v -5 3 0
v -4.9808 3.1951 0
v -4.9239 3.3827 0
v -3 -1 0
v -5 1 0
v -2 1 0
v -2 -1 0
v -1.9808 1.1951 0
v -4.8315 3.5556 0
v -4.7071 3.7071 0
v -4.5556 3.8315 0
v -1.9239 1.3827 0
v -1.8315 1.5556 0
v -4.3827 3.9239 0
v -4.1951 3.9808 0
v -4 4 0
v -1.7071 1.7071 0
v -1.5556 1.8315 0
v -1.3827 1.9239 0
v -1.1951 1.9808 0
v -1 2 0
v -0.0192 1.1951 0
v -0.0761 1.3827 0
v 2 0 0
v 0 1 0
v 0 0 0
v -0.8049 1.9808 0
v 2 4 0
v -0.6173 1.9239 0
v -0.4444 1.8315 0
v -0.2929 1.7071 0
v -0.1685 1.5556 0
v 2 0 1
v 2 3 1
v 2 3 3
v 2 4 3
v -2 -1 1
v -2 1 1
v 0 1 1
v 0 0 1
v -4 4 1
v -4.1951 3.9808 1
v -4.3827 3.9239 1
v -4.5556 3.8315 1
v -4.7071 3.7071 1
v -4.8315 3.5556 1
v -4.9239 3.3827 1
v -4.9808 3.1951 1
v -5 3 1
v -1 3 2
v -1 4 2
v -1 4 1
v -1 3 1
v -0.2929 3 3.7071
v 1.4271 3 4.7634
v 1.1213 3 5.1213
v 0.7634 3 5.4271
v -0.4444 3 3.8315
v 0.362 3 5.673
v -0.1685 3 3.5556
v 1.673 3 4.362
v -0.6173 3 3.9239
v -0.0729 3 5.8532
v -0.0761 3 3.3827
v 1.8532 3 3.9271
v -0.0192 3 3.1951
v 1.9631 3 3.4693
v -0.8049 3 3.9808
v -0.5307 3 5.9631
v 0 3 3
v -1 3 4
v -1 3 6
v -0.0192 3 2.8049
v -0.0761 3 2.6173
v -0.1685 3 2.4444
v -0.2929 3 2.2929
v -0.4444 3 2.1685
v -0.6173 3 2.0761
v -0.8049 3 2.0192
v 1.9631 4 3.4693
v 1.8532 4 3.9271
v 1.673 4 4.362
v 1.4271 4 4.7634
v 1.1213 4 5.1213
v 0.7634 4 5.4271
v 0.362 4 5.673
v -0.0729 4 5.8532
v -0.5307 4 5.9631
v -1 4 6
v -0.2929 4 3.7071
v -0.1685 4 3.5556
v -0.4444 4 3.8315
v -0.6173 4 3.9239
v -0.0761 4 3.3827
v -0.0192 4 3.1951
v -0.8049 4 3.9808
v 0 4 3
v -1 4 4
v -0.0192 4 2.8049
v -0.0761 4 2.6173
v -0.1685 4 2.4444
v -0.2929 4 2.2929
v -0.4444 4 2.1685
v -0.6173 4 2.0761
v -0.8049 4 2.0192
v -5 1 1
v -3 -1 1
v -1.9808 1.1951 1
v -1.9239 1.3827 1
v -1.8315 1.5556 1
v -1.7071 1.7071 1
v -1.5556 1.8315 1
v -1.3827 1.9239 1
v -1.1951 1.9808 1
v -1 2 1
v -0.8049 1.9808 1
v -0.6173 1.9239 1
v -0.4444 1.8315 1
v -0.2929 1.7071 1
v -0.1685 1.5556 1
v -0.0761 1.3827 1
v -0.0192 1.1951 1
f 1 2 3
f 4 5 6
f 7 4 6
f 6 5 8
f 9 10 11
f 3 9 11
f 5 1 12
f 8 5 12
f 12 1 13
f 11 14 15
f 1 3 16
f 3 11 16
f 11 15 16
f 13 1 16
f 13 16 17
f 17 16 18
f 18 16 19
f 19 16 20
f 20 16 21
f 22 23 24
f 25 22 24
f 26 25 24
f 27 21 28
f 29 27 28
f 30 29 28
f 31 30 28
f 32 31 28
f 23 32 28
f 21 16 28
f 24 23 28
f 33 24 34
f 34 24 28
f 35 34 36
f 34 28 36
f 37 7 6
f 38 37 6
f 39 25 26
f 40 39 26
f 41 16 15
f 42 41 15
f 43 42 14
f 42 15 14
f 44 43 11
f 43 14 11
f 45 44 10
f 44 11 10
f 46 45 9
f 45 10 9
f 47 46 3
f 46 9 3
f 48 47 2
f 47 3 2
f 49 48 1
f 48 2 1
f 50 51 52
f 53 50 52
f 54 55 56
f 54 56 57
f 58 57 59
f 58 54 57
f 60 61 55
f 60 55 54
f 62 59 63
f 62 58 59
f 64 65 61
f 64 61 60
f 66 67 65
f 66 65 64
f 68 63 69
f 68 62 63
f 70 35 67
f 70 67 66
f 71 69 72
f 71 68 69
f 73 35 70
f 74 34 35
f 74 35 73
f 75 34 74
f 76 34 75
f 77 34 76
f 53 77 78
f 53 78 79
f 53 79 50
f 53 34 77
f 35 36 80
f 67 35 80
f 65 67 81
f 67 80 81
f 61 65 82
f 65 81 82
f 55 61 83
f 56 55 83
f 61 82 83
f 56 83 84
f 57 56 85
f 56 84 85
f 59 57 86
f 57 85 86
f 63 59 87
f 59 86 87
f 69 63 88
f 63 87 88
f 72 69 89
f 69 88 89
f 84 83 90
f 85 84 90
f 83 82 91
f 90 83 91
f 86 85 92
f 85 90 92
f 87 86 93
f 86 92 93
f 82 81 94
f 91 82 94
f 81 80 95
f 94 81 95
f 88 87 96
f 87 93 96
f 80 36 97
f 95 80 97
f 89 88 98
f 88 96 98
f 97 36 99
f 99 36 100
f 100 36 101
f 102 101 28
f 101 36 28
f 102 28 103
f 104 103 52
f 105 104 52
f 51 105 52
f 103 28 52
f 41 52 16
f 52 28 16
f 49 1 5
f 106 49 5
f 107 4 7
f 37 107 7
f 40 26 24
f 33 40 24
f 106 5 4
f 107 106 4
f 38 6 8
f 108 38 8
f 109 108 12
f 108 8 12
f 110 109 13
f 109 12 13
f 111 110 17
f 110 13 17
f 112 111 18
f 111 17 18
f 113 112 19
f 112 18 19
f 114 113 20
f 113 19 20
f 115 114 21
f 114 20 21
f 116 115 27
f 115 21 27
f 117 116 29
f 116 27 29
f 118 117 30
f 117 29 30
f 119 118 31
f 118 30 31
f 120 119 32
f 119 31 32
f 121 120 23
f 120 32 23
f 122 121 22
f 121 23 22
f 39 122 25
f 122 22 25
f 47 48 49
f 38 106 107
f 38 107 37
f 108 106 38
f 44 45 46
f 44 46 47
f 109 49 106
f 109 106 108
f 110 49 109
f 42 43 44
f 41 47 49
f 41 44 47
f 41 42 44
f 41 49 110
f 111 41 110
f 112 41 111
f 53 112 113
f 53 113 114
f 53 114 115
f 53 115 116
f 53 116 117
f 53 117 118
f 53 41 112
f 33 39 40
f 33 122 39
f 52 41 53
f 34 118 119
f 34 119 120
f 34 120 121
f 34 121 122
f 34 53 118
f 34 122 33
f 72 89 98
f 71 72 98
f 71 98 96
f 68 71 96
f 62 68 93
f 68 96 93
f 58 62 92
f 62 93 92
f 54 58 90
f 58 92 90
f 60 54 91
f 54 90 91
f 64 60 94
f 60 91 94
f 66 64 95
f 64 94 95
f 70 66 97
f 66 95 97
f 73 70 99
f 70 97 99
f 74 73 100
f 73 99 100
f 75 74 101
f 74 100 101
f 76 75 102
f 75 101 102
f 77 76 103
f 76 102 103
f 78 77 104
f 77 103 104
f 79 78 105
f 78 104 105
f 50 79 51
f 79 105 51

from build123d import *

# Parameters (mm, degrees)
BOSS_EXTRUDE1_DEPTH = 1
BOSS_EXTRUDE2_DEPTH = 1


with BuildPart() as part:
    # Sketch1 → Boss-Extrude1 (new body)
    with BuildSketch(Plane.XY):
        with BuildLine():
            Line((0, 0), (2, 0))
            Line((2, 0), (2, 4))
            Line((2, 4), (-4, 4))
            ThreePointArc((-4, 4), (-4.707106781, 3.707106781), (-5, 3))
            Line((-5, 3), (-5, 1))
            Line((-5, 1), (-3, -1))
            Line((-3, -1), (-2, -1))
            Line((-2, -1), (-2, 1))
            ThreePointArc((-2, 1), (-1, 2), (0, 1))
            Line((0, 1), (0, 0))
        make_face()
    extrude(amount=BOSS_EXTRUDE1_DEPTH)

    # Sketch2 → Boss-Extrude2 (add)
    with BuildSketch(Plane(origin=(0, 4, 0), x_dir=(1, 0, 0), z_dir=(0, 1, 0))):
        with BuildLine():
            Line((-1, -1), (2, -1))
            Line((2, -1), (2, -3))
            ThreePointArc((2, -3), (1.121320344, -5.121320344), (-1, -6))
            Line((-1, -6), (-1, -4))
            ThreePointArc((-1, -4), (0, -3), (-1, -2))
            Line((-1, -2), (-1, -1))
        make_face()
    extrude(amount=-BOSS_EXTRUDE2_DEPTH)


solid = part.part
